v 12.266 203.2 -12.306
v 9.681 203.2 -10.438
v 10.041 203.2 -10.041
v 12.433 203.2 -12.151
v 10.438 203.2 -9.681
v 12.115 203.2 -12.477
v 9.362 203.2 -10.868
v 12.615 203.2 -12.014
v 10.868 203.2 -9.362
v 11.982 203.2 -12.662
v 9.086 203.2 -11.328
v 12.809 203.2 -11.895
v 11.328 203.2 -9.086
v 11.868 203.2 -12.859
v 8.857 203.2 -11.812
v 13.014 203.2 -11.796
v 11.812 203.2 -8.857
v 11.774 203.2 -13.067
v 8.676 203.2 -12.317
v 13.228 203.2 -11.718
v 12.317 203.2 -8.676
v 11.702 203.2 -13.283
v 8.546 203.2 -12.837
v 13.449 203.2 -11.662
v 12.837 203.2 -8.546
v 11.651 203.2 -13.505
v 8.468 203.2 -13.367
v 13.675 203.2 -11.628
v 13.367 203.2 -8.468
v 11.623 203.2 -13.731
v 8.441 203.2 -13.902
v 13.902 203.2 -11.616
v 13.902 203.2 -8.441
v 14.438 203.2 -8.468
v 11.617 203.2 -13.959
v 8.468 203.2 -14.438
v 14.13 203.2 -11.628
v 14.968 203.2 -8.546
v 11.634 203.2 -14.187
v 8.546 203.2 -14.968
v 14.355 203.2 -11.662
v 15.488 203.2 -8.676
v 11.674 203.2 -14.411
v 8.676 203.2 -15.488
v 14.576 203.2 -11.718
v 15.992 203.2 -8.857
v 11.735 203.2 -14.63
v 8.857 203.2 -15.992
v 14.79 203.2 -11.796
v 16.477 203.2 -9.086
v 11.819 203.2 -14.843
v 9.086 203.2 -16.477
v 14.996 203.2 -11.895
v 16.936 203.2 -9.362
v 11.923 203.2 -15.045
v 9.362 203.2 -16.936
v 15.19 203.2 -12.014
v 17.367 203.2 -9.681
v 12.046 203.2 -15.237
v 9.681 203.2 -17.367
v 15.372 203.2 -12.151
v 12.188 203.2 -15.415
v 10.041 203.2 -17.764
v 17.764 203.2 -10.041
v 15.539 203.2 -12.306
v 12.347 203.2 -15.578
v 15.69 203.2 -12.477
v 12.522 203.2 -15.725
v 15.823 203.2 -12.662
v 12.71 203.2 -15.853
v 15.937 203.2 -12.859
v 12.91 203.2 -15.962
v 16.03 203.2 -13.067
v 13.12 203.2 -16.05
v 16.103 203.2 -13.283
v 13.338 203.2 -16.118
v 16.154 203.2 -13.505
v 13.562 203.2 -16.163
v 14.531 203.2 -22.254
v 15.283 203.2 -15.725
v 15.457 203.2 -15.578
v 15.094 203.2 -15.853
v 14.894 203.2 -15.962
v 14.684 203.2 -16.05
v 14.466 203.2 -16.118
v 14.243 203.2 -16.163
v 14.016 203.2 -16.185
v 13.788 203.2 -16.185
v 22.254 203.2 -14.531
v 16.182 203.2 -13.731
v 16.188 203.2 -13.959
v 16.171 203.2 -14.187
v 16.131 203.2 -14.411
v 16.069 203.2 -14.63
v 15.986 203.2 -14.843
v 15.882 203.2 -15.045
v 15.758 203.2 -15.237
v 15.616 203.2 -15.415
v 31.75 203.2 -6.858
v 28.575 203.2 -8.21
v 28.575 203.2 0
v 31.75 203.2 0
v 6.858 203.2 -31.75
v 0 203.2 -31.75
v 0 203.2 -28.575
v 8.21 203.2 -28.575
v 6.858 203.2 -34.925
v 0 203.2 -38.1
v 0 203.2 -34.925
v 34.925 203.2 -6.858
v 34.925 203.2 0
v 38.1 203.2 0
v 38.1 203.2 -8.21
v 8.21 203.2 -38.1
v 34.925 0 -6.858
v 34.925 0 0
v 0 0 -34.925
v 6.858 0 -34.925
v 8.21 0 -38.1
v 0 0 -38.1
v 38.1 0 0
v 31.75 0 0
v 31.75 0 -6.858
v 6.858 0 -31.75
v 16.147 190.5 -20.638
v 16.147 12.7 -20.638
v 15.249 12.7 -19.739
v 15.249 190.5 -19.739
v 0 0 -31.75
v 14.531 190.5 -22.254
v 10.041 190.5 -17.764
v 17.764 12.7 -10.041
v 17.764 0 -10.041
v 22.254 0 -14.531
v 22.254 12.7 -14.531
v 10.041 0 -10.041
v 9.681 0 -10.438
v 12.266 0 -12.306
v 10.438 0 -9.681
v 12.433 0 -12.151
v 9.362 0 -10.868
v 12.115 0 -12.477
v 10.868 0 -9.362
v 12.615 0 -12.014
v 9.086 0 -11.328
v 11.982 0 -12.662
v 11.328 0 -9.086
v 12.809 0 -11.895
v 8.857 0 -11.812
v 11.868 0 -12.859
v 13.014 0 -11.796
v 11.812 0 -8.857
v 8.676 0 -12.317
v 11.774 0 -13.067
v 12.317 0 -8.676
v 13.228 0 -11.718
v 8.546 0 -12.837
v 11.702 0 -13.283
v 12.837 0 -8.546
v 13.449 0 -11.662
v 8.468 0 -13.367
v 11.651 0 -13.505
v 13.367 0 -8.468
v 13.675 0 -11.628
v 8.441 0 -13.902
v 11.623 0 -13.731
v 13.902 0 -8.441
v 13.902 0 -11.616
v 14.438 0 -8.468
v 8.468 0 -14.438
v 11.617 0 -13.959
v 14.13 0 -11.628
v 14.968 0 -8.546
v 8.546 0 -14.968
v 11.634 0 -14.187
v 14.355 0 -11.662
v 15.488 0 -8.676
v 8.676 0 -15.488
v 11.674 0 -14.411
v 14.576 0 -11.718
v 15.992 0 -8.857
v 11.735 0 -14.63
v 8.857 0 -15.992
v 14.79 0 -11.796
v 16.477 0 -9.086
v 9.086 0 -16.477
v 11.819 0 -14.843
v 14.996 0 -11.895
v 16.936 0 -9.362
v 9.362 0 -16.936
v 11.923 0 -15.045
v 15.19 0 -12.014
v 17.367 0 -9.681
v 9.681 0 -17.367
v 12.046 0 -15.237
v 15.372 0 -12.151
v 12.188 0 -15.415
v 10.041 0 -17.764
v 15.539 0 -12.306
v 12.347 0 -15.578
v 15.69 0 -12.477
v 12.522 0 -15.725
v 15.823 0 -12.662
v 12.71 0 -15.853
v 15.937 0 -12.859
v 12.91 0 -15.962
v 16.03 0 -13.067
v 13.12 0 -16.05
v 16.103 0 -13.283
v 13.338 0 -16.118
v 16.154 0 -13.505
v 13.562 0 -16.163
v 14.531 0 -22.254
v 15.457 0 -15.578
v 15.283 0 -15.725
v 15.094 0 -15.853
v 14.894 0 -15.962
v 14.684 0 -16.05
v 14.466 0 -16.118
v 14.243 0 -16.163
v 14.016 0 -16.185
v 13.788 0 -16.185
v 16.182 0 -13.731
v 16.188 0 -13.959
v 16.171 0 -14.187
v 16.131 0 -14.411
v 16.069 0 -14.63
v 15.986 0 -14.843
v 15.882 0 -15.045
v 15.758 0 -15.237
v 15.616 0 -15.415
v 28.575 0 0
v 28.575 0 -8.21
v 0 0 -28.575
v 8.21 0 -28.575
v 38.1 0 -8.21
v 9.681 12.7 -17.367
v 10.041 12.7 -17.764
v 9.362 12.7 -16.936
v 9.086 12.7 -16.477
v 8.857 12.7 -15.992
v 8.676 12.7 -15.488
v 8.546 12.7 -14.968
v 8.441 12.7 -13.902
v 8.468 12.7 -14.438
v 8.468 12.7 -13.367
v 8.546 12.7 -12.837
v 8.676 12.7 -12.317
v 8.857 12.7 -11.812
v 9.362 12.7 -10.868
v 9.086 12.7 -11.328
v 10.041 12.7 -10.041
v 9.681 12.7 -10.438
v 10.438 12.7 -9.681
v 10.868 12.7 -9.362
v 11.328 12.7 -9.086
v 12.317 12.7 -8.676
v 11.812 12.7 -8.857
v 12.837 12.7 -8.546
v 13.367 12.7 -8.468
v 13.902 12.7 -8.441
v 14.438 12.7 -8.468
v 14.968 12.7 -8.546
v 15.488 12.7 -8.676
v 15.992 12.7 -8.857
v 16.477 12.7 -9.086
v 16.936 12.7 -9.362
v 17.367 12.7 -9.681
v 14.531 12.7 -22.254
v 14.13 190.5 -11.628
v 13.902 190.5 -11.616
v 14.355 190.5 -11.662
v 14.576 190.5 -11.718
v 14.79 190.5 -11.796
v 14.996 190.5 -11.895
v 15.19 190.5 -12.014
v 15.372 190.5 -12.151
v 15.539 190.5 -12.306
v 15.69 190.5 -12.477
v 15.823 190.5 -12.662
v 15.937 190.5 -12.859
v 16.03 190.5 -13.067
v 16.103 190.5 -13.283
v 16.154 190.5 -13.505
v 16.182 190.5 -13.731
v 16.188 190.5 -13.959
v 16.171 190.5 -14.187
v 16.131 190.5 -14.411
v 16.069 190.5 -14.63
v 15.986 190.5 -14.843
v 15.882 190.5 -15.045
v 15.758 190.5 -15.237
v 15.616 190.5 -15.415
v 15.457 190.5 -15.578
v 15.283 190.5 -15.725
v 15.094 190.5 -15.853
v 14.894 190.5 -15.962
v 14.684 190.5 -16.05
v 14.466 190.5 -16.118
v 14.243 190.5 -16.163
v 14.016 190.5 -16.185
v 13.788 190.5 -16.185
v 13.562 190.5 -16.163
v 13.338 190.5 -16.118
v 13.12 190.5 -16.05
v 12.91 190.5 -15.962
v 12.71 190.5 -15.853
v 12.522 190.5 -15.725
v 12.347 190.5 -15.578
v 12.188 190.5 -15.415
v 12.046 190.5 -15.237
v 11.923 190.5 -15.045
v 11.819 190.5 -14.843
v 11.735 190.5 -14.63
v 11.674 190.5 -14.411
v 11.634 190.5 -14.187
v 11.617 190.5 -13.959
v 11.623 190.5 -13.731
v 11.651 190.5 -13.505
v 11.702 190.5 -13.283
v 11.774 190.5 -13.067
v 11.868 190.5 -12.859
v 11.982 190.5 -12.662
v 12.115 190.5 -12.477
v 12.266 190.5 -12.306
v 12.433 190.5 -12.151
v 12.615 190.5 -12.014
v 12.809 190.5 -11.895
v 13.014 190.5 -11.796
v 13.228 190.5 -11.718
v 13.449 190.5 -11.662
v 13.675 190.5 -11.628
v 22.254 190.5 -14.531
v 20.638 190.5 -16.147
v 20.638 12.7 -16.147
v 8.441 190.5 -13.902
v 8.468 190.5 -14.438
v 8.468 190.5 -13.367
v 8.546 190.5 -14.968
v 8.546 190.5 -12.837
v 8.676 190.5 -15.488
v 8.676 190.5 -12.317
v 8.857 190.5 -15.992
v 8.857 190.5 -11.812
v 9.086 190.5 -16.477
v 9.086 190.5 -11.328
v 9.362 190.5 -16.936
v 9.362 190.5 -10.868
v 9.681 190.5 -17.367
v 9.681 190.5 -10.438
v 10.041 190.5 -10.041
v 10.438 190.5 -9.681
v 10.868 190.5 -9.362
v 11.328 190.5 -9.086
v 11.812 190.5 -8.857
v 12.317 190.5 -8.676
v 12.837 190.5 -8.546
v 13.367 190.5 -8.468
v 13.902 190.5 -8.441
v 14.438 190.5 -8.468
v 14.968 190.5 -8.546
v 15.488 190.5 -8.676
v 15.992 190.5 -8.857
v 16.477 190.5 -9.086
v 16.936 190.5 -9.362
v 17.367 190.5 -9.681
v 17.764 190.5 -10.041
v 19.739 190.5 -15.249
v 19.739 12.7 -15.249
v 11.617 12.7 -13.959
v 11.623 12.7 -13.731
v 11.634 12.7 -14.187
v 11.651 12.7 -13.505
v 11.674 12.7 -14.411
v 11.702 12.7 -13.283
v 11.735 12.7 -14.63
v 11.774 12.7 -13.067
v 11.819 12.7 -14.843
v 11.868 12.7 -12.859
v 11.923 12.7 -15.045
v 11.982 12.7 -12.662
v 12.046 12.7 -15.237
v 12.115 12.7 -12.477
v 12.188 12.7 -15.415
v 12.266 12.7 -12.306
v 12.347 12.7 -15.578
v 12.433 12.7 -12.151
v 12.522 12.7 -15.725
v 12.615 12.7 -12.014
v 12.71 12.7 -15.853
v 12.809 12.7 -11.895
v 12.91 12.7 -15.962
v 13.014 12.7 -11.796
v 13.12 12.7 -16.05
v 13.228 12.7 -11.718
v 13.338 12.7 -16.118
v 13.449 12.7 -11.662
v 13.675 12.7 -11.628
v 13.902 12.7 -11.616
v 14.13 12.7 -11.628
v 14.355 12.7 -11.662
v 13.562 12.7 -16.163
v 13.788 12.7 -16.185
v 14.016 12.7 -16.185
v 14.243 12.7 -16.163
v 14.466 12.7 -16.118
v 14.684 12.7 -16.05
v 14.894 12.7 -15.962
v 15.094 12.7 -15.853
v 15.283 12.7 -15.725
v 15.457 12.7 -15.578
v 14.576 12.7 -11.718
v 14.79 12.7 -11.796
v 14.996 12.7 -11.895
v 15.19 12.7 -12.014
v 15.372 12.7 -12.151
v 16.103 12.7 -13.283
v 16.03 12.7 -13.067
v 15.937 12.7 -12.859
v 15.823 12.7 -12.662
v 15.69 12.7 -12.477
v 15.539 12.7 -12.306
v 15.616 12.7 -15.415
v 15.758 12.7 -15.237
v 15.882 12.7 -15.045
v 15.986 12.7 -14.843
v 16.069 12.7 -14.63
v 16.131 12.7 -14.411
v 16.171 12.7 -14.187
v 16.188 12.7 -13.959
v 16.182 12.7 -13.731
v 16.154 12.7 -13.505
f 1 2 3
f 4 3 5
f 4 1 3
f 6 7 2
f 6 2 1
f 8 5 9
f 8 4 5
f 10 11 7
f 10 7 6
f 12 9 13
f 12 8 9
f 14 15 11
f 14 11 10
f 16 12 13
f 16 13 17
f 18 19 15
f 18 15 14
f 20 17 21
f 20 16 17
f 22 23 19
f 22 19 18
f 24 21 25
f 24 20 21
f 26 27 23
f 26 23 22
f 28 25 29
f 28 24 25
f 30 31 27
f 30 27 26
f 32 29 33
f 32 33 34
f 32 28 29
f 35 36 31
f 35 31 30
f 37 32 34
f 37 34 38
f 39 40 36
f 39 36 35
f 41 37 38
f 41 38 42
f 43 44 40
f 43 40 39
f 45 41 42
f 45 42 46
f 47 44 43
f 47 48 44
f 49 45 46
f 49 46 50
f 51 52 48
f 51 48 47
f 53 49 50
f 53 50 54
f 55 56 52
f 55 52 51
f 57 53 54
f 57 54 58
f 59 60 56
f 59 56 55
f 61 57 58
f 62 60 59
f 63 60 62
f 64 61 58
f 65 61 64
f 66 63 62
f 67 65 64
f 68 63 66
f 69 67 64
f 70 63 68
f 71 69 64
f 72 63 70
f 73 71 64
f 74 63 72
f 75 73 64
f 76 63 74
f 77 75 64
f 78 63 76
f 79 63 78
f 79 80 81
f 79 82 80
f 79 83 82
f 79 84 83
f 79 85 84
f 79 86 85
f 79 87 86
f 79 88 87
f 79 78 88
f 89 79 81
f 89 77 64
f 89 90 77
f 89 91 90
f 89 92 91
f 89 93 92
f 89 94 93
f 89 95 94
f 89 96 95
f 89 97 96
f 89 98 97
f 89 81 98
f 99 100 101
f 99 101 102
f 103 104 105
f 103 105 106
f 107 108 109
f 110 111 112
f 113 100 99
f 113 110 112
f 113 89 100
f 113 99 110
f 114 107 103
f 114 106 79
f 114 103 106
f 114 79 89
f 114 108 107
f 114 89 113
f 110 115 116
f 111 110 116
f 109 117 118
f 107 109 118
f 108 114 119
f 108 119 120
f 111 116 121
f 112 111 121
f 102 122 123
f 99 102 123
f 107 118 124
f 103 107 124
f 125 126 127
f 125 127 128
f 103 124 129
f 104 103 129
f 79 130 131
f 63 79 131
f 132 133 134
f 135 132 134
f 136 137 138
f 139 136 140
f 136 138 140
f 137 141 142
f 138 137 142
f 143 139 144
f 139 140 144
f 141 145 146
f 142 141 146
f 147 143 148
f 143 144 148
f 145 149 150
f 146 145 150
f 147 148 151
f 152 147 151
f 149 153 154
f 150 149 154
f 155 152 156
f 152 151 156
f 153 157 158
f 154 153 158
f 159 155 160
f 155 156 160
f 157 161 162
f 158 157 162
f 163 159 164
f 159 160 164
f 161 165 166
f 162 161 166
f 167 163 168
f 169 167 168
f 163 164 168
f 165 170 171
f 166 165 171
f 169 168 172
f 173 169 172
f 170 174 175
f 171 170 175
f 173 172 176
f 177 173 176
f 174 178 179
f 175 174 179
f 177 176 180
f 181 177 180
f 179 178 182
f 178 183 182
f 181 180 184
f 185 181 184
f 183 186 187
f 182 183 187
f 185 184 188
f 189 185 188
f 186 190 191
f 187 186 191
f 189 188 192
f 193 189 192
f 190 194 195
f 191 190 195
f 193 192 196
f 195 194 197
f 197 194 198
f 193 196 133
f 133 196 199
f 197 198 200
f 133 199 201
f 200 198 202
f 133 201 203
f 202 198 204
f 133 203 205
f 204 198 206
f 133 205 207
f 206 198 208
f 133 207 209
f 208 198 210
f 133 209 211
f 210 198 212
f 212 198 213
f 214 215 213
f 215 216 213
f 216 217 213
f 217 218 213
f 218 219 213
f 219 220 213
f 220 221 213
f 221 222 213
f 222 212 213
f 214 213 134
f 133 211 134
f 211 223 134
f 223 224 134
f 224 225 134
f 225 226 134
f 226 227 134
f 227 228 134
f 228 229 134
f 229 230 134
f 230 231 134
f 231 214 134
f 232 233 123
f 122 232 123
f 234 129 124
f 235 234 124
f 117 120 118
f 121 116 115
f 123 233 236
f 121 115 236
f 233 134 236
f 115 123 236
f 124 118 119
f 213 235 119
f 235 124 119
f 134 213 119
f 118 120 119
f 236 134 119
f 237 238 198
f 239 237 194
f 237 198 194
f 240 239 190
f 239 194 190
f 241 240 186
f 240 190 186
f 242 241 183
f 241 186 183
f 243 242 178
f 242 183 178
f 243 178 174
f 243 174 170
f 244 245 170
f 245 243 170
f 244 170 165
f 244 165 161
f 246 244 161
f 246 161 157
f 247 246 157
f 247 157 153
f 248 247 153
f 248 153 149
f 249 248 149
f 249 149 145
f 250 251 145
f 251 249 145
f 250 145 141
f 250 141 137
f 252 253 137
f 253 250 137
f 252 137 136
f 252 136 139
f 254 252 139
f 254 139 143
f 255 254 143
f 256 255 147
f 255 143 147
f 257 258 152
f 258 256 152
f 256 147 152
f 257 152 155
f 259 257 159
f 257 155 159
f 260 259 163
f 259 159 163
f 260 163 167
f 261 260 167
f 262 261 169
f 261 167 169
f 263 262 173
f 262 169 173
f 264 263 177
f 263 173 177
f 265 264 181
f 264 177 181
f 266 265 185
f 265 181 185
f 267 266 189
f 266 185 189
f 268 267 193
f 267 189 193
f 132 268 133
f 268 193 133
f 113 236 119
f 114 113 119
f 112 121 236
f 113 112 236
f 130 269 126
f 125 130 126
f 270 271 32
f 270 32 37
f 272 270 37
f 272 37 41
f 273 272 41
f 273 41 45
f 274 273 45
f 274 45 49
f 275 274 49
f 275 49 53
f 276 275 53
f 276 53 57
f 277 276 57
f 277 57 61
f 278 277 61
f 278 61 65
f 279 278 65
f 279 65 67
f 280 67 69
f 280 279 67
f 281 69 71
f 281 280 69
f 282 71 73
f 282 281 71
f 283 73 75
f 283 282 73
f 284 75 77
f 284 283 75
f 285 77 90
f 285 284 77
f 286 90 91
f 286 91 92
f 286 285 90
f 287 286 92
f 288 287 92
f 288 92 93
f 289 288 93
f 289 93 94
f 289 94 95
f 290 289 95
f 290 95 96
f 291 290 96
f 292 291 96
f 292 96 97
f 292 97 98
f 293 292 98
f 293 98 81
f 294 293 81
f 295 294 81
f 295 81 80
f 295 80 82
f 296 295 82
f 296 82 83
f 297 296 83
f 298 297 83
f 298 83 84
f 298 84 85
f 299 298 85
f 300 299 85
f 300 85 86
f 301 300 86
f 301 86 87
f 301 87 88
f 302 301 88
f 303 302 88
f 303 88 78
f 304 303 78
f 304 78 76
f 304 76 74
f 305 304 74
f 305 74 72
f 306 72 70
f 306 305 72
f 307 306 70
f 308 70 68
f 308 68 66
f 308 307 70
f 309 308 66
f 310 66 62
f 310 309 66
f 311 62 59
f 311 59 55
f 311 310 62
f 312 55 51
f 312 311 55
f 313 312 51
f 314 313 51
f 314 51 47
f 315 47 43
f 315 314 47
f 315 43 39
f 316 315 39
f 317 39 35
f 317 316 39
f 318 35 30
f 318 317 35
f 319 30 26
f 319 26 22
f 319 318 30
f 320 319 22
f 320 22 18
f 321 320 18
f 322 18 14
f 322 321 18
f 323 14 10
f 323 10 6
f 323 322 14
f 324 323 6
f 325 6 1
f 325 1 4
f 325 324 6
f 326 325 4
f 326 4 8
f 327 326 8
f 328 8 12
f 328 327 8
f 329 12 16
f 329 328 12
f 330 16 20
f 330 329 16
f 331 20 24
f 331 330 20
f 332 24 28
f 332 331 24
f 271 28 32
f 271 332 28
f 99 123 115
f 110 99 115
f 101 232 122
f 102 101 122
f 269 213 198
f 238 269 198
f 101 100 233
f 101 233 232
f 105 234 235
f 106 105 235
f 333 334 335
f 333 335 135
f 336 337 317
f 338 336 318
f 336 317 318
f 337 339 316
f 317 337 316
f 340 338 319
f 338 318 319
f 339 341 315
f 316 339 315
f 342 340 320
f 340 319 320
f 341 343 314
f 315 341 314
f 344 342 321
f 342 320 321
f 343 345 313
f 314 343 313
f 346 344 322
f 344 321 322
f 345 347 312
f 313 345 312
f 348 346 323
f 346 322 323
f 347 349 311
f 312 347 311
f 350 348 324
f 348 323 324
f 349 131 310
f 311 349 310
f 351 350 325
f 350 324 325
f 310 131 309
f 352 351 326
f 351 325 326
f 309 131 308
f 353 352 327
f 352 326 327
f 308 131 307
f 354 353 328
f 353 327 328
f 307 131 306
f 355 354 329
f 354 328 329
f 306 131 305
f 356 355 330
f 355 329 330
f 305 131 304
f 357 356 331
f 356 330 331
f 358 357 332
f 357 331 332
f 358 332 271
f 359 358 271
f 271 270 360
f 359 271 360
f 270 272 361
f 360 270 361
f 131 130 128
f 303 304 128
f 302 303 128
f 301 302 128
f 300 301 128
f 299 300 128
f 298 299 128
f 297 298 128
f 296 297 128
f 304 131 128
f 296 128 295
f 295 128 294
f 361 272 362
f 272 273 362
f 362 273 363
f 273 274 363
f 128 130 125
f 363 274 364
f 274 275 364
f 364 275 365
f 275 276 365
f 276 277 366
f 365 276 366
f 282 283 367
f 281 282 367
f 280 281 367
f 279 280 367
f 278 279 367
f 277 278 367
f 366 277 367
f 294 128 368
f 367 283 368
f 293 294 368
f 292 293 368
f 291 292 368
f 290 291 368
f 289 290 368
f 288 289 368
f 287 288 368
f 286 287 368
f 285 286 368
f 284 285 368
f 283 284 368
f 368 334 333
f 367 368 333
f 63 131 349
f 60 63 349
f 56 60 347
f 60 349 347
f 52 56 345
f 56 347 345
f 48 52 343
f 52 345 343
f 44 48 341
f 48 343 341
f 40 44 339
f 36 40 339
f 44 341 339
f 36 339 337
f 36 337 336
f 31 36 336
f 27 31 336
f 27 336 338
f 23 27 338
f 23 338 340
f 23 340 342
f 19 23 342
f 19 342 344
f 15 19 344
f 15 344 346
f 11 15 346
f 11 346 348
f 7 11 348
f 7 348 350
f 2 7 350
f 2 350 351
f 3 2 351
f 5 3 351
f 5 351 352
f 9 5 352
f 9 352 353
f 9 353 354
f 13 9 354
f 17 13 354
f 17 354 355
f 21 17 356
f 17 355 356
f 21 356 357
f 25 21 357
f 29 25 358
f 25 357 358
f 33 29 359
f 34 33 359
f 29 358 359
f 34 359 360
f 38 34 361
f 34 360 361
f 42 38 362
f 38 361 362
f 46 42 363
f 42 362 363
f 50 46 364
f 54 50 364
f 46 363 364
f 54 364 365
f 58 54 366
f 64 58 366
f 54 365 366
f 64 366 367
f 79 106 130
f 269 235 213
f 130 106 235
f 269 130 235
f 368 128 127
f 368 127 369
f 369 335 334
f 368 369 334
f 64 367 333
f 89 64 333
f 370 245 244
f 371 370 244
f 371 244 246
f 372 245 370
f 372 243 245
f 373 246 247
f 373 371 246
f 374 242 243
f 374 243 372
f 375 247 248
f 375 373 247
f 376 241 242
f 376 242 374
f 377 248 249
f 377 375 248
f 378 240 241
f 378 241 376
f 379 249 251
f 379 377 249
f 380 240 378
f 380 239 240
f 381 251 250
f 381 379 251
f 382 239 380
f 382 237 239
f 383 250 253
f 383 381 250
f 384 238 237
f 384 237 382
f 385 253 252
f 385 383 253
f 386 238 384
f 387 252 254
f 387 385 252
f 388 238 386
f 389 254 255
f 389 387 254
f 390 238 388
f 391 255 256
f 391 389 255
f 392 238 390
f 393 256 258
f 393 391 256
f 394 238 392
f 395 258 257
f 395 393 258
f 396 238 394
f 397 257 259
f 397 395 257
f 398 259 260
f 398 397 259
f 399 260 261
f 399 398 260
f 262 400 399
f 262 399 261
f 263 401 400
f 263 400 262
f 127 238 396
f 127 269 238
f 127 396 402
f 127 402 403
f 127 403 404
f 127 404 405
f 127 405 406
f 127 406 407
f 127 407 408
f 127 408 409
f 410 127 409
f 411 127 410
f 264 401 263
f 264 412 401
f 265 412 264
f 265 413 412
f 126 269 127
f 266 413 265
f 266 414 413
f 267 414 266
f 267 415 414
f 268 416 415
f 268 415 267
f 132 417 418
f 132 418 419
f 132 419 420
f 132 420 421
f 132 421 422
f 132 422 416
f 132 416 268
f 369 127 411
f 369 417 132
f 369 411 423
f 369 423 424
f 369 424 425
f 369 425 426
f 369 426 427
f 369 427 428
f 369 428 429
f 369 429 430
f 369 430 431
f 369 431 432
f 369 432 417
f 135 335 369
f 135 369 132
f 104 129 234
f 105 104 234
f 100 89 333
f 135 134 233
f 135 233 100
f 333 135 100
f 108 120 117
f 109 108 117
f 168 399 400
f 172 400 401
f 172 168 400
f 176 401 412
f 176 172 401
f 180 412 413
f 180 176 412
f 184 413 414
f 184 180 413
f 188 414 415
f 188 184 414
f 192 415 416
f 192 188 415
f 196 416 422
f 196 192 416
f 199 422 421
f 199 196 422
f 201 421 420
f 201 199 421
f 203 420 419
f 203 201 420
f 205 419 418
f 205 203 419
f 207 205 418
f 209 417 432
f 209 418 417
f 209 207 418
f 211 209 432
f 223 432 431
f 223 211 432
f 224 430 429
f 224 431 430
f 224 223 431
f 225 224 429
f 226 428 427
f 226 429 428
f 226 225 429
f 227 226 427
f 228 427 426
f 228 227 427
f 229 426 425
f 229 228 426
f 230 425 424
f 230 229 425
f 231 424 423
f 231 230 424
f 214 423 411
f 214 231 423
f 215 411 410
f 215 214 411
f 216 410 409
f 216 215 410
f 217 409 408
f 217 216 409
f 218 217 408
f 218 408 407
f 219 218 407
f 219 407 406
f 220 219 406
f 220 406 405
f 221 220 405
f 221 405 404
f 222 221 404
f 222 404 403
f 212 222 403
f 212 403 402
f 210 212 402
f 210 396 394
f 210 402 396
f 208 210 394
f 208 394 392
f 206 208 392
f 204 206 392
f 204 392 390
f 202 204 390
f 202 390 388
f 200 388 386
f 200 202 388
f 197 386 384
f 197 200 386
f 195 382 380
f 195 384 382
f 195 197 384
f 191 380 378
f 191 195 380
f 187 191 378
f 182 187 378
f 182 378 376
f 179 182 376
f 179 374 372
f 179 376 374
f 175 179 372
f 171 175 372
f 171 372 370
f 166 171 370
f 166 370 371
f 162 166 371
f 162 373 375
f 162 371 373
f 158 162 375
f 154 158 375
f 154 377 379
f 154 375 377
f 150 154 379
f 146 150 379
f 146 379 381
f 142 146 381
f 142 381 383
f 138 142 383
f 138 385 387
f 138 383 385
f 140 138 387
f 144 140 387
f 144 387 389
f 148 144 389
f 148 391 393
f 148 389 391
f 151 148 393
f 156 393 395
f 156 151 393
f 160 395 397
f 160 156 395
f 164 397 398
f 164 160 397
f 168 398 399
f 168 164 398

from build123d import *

# Parameters (mm, degrees)
SKETCH1_R           = 2.286
BOSS_EXTRUDE1_DEPTH = 203.2
SKETCH2_W           = 10.922
SKETCH2_H           = 177.8
CUT_EXTRUDE1_DEPTH  = 11.811
SKETCH3_W           = 6.35
SKETCH3_H           = 177.8
BOSS_EXTRUDE2_DEPTH = 1.27


with BuildPart() as part:
    # Sketch1 → Boss-Extrude1 (new body)
    with BuildSketch(Plane(origin=(0, 0, 0), x_dir=(1, 0, 0), z_dir=(0, 1, 0))):
        with BuildLine():
            Line((38.1, 0), (38.1, 8.209871939))
            Line((38.1, 8.209871939), (8.209871939, 38.1))
            Line((8.209871939, 38.1), (0, 38.1))
            Line((0, 38.1), (0, 34.925))
            Line((0, 34.925), (6.858, 34.925))
            Line((6.858, 34.925), (6.858, 31.75))
            Line((6.858, 31.75), (0, 31.75))
            Line((0, 31.75), (0, 28.575))
            Line((0, 28.575), (8.209871939, 28.575))
            Line((8.209871939, 28.575), (14.530925838, 22.253946102))
            Line((14.530925838, 22.253946102), (10.040797777, 17.763818041))
            ThreePointArc((10.040797777, 17.763818041), (10.040797777, 10.040797777), (17.763818041, 10.040797777))
            Line((17.763818041, 10.040797777), (22.253946102, 14.530925838))
            Line((22.253946102, 14.530925838), (28.575, 8.209871939))
            Line((28.575, 8.209871939), (28.575, 0))
            Line((28.575, 0), (31.75, 0))
            Line((31.75, 0), (31.75, 6.858))
            Line((31.75, 6.858), (34.925, 6.858))
            Line((34.925, 6.858), (34.925, 0))
            Line((34.925, 0), (38.1, 0))
        make_face()
        with Locations(Location((13.902307909, 13.902307909, 0), (0, 0, 270))):
            Circle(SKETCH1_R, mode=Mode.SUBTRACT)
    extrude(amount=BOSS_EXTRUDE1_DEPTH)

    # Sketch2 → Cut-Extrude1 (cut)
    with BuildSketch(Plane(origin=(18.39243597, 0, -18.39243597), x_dir=(0.7071067811865541, 0, 0.7071067811865409), z_dir=(-0.7071067811865409, 0, 0.7071067811865541))):
        with Locations((0, 101.6)):
            Rectangle(SKETCH2_W, SKETCH2_H)
    extrude(amount=CUT_EXTRUDE1_DEPTH, mode=Mode.SUBTRACT)

    # Sketch3 → Boss-Extrude2 (add)
    with BuildSketch(Plane(origin=(18.39243597, 0, -18.39243597), x_dir=(0.7071067811865479, 0, 0.7071067811865472), z_dir=(-0.7071067811865472, 0, 0.7071067811865479))):
        with Locations((0, 101.6)):
            Rectangle(SKETCH3_W, SKETCH3_H)
    extrude(amount=BOSS_EXTRUDE2_DEPTH)


solid = part.part
